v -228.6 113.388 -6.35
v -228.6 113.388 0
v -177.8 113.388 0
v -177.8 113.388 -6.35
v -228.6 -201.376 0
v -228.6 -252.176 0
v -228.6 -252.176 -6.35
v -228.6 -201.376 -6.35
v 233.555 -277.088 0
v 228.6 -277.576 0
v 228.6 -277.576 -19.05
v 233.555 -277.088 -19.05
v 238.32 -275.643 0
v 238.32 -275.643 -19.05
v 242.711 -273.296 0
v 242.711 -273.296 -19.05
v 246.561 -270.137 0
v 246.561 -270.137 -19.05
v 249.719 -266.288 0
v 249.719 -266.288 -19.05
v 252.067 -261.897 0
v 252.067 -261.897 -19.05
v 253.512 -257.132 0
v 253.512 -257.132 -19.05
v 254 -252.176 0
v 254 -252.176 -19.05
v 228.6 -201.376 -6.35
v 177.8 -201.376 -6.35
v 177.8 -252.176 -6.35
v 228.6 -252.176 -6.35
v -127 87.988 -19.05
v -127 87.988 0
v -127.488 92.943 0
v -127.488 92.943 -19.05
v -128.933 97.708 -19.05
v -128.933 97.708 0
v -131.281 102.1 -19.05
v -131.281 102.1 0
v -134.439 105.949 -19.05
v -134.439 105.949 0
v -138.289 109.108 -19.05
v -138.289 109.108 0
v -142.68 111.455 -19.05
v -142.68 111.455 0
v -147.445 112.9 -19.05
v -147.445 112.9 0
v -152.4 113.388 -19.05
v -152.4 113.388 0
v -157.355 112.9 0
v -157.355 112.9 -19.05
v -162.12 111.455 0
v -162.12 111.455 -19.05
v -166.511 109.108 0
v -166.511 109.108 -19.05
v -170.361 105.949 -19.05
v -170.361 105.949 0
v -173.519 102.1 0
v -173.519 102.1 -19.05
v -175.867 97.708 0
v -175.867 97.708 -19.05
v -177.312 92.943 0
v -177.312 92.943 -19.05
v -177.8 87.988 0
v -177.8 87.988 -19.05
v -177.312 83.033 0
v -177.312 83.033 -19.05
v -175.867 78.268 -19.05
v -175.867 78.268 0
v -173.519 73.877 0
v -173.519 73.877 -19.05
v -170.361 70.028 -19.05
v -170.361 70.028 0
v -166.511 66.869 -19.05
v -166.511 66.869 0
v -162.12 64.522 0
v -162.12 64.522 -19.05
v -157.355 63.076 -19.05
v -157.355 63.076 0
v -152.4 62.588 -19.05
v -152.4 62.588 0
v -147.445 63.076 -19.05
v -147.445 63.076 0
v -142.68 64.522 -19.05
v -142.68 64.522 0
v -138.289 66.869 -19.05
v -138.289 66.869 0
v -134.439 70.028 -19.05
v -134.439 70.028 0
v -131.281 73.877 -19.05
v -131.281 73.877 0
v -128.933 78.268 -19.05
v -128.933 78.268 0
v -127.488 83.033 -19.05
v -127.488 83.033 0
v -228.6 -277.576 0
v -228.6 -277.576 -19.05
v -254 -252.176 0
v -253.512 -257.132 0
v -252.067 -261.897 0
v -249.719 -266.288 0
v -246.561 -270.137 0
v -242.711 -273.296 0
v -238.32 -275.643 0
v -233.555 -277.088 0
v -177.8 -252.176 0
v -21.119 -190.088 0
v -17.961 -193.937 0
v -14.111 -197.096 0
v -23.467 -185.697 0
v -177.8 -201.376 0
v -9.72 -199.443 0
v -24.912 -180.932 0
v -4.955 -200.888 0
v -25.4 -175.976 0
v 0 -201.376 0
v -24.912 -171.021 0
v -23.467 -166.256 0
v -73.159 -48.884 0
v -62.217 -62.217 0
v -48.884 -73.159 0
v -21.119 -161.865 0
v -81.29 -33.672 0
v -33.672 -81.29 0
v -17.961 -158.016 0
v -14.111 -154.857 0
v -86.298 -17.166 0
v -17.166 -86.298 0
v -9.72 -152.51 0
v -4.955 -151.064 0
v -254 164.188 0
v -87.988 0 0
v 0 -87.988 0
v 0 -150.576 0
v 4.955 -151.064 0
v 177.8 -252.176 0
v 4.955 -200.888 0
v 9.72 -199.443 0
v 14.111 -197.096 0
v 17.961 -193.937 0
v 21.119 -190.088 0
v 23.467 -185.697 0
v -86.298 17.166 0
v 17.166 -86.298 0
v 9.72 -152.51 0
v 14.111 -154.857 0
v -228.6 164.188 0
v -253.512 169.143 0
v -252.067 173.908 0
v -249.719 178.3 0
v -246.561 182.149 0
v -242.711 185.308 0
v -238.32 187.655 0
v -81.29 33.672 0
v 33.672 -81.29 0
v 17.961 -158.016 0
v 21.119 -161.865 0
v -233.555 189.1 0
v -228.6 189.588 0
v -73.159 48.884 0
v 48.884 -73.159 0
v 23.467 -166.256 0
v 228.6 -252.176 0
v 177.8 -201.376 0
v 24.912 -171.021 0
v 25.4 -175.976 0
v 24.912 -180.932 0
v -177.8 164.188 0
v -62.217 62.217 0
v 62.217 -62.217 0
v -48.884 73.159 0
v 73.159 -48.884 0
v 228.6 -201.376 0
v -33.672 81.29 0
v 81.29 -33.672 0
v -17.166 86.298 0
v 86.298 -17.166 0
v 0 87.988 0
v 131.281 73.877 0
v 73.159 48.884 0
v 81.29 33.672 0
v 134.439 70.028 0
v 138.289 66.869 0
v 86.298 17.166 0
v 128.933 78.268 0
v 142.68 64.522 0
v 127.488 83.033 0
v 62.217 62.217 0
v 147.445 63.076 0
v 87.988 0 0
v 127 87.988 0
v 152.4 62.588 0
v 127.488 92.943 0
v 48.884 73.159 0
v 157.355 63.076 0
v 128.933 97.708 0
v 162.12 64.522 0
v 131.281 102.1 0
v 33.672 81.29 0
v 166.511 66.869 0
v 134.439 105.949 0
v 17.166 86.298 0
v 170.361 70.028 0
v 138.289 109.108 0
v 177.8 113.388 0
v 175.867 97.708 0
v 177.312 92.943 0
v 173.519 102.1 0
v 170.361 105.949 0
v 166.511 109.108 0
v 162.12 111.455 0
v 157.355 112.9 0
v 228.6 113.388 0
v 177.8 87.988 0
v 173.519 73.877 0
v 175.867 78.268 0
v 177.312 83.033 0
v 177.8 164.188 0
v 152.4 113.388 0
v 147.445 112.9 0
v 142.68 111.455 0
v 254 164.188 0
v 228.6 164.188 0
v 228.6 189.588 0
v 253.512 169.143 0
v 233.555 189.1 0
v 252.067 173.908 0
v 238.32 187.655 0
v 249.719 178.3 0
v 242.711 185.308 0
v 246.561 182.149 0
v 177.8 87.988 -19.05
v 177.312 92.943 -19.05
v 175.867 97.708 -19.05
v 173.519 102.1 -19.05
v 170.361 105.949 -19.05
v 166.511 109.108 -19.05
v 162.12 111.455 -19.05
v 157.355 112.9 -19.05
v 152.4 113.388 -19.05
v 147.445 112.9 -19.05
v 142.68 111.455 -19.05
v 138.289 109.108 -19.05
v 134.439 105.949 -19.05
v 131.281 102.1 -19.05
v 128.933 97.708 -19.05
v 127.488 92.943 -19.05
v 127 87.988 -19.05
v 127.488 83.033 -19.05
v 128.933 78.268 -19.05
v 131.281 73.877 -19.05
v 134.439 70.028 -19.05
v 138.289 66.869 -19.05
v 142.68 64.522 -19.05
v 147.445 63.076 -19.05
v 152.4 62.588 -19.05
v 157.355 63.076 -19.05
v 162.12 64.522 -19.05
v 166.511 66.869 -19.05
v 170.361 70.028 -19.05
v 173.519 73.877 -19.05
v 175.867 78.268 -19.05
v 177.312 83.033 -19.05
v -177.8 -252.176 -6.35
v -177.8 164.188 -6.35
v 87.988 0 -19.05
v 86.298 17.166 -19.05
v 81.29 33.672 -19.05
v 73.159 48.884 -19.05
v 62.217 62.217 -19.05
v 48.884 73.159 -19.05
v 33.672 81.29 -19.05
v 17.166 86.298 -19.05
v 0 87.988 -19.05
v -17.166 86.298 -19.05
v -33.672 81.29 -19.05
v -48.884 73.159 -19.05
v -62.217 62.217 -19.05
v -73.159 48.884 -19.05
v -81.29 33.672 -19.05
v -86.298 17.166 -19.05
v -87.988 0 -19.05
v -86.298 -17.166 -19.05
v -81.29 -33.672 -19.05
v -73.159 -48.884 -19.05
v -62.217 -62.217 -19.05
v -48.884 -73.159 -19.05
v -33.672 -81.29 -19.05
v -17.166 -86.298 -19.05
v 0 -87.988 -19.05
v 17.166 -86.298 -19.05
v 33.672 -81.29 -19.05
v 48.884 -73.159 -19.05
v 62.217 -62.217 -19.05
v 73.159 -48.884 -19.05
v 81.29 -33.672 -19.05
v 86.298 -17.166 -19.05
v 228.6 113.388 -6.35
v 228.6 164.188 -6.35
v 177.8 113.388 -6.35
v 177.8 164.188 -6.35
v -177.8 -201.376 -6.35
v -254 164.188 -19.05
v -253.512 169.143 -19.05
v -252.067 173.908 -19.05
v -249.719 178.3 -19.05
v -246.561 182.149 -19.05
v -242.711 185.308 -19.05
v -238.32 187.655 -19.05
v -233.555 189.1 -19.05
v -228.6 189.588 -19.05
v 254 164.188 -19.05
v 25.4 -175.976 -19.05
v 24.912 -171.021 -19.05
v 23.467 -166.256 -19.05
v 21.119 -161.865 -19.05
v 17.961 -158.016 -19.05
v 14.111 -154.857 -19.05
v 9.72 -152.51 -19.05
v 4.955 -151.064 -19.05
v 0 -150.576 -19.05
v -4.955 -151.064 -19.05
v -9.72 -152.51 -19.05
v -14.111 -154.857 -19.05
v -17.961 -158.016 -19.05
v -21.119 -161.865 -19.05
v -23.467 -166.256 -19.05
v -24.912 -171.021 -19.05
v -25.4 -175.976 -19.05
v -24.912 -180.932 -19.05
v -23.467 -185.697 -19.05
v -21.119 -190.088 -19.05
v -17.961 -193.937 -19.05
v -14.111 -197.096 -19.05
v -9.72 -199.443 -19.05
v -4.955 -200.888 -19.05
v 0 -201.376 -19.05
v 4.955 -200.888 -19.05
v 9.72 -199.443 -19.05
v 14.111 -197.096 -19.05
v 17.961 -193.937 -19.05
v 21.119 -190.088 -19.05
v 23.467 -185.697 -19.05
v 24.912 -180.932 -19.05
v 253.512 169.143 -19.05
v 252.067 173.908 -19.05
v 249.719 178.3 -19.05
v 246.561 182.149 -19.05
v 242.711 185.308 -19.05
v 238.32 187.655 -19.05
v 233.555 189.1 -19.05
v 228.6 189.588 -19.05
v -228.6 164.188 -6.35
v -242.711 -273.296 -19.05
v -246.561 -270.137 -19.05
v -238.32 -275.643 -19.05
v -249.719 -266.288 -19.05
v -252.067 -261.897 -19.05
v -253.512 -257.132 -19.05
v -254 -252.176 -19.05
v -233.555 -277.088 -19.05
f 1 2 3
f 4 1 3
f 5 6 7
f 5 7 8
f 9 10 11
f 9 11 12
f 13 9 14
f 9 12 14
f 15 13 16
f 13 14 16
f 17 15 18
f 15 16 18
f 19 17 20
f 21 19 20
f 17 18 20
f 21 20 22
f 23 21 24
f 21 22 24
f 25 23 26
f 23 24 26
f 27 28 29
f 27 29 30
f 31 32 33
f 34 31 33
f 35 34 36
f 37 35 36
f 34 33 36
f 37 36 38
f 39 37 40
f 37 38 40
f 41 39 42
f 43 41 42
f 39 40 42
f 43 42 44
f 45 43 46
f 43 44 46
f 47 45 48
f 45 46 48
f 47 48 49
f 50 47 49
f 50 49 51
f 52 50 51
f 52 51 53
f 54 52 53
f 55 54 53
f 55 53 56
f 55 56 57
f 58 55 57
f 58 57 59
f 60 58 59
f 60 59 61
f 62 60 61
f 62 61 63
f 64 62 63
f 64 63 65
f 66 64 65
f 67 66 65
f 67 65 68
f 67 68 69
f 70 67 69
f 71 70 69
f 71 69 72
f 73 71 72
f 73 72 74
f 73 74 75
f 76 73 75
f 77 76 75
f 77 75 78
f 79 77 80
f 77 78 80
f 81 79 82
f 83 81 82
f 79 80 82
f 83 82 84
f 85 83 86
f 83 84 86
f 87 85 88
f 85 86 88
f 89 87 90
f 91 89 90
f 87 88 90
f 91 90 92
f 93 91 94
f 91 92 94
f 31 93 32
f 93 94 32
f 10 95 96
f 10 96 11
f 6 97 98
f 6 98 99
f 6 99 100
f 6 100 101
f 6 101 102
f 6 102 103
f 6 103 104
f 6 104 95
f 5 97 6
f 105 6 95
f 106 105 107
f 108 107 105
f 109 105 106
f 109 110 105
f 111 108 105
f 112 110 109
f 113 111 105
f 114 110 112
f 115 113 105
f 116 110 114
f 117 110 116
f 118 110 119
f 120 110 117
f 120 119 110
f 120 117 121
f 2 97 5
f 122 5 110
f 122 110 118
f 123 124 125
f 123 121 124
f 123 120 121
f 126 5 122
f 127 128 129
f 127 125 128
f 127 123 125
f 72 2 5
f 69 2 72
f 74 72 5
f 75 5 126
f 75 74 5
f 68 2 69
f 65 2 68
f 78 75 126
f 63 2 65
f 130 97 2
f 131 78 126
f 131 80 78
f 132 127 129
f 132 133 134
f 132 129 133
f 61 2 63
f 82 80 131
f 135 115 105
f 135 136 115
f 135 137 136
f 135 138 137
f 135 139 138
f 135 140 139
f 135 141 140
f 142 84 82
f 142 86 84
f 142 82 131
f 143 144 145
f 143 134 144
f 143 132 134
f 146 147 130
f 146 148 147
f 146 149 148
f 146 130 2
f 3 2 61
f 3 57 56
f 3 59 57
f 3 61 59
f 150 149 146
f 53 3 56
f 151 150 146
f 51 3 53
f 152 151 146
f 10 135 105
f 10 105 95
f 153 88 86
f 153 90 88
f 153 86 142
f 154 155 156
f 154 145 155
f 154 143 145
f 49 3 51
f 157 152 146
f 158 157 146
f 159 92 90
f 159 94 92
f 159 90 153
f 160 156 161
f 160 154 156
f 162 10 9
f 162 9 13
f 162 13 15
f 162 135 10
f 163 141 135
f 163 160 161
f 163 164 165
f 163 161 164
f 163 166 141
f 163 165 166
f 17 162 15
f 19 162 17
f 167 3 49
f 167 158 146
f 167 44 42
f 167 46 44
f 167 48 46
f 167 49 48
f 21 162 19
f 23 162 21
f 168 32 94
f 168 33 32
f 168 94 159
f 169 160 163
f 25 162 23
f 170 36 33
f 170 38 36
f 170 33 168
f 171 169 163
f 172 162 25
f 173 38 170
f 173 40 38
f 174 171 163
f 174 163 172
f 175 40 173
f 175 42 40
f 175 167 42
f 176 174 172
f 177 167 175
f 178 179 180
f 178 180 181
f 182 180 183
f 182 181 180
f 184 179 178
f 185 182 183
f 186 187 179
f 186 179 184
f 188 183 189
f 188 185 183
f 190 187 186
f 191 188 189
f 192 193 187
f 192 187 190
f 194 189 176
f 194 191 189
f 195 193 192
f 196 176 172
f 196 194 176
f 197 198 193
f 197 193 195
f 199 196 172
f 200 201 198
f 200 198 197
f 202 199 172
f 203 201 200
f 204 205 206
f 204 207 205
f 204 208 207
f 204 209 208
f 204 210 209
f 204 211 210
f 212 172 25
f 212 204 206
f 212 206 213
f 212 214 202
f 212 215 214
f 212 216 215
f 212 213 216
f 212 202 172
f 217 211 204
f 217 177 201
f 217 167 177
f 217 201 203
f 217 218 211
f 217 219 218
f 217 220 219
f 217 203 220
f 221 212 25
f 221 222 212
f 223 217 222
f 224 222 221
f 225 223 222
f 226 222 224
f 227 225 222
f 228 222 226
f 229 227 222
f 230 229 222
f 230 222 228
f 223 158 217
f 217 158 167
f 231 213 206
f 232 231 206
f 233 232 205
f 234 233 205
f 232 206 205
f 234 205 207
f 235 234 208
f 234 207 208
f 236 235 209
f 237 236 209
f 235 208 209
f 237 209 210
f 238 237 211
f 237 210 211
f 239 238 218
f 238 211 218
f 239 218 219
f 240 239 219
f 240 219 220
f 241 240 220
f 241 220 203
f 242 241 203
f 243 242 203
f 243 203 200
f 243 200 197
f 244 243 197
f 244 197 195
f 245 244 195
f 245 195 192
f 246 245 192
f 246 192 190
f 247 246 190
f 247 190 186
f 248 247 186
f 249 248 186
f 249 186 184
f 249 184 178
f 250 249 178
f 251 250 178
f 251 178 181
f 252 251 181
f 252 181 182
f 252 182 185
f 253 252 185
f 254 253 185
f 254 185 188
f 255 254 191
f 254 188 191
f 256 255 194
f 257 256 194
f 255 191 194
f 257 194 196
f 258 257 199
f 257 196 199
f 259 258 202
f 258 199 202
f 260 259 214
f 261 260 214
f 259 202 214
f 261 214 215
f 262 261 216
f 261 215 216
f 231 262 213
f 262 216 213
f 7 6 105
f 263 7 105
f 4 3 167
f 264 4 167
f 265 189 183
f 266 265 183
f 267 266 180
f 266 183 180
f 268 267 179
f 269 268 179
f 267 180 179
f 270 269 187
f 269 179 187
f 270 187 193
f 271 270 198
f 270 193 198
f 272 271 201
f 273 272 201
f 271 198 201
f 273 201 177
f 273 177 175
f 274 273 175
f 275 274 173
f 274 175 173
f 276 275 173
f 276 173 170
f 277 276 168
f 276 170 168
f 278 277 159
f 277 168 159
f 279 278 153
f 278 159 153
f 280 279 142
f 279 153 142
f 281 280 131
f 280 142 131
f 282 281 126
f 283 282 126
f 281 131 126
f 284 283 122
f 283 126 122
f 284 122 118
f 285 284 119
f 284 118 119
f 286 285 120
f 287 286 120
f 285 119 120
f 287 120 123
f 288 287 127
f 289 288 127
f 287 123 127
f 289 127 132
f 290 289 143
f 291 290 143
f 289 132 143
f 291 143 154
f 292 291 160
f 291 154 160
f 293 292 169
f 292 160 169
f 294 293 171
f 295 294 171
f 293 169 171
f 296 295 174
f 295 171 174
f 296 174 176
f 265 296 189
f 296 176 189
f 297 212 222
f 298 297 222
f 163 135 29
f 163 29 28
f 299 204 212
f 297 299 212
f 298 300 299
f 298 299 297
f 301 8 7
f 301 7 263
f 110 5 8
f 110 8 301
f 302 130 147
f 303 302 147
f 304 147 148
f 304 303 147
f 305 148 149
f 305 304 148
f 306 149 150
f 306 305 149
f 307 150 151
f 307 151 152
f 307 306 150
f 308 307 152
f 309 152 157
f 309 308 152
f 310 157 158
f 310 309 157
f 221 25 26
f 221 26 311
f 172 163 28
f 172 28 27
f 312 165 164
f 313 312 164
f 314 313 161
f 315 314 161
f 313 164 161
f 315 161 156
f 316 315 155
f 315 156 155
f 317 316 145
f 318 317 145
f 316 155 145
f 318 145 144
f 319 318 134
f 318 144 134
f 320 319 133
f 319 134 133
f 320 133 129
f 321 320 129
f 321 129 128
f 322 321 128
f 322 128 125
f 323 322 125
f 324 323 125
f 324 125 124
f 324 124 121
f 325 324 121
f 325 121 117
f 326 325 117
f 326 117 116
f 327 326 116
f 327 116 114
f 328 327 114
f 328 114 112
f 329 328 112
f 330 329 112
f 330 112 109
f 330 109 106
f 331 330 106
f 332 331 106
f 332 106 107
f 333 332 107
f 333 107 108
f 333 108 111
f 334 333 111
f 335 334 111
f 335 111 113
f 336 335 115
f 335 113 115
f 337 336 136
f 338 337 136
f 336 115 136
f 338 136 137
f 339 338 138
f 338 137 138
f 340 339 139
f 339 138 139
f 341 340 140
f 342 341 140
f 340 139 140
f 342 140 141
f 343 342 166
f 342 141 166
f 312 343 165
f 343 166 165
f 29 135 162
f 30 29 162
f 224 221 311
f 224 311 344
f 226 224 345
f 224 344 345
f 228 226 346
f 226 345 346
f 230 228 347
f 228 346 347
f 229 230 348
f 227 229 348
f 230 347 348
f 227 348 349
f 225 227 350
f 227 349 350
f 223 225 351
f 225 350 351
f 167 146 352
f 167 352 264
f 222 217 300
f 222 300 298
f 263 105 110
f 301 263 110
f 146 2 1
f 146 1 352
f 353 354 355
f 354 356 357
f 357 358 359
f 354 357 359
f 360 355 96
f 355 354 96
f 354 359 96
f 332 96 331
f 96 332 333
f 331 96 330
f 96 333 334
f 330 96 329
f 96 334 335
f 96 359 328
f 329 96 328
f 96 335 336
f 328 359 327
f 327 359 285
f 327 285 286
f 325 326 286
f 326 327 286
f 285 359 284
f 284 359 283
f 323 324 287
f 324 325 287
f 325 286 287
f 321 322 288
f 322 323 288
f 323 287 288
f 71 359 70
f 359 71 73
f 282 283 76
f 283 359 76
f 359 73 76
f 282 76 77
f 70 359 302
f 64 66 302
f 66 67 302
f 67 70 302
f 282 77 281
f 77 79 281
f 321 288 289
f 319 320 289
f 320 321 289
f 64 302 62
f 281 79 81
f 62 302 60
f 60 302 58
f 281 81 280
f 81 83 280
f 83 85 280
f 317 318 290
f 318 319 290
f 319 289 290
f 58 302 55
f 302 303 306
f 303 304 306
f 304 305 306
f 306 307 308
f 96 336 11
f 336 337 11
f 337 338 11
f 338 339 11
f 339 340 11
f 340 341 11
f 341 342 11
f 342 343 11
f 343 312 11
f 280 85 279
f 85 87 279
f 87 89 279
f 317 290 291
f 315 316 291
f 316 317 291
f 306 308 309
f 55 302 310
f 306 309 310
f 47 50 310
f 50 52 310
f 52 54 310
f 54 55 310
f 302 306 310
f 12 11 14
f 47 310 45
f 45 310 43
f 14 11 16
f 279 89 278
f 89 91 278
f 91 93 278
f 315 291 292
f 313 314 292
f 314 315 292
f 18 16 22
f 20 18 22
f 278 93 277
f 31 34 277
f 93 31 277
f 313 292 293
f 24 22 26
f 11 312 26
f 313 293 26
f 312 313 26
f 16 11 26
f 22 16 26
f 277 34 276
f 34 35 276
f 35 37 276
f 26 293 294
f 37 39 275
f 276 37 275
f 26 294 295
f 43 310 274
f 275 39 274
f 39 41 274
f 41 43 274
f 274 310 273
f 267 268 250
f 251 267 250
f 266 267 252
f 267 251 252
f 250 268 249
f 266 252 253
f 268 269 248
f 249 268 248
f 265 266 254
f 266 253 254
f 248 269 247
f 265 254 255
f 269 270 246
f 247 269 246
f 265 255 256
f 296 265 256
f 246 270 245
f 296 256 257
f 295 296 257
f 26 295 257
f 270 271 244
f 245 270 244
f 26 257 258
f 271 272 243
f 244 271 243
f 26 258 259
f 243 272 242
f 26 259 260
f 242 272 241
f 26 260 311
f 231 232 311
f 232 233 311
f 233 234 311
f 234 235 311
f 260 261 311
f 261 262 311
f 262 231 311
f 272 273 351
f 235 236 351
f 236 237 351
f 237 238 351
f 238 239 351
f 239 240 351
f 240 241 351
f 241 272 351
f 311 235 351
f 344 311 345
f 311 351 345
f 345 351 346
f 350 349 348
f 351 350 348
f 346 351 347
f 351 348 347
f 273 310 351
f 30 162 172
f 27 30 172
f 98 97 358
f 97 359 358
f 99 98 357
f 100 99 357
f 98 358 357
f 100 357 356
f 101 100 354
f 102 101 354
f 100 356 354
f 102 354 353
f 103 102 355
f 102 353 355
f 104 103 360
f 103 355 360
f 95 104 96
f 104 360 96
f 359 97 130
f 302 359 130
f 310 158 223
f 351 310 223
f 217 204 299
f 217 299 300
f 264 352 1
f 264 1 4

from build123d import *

# Parameters (mm, degrees)
F0_W     = 508
F0_H     = 467.164543
F0_W_2   = 50.8
F0_H_2   = 50.8
F0_R     = 25.4
F0_R_2   = 87.988181
F1_DEPTH = 19.05
F2_R     = 25.4
F3_DEPTH = 6.35
F4_DEPTH = 19.051


with BuildPart() as f1:
    # F0 (on Top) → F1 (new body)
    with BuildSketch(Plane.XY):
        with Locations((0, -43.99409)):
            Rectangle(F0_W, F0_H)
        with Locations((-203.2, -226.776362)):
            Rectangle(F0_W_2, F0_H_2, mode=Mode.SUBTRACT)
        with Locations((0, -175.976362)):
            Circle(F0_R, mode=Mode.SUBTRACT)
        with Locations((203.2, -226.776362)):
            Rectangle(F0_W_2, F0_H_2, mode=Mode.SUBTRACT)
        with Locations((-152.4, 87.988181)):
            Circle(F0_R, mode=Mode.SUBTRACT)
        with Locations((-203.2, 138.788181)):
            Rectangle(F0_W_2, F0_H_2, mode=Mode.SUBTRACT)
        Circle(F0_R_2, mode=Mode.SUBTRACT)
        with Locations((152.4, 87.988181)):
            Circle(F0_R, mode=Mode.SUBTRACT)
        with Locations((203.2, 138.788181)):
            Rectangle(F0_W_2, F0_H_2, mode=Mode.SUBTRACT)
        with Locations((-203.2, 138.788181)):
            Rectangle(F0_W_2, F0_H_2)
        with Locations((-203.2, -226.776362)):
            Rectangle(F0_W_2, F0_H_2)
        with Locations((203.2, -226.776362)):
            Rectangle(F0_W_2, F0_H_2)
        with Locations((203.2, 138.788181)):
            Rectangle(F0_W_2, F0_H_2)
        with Locations((-152.4, 87.988181)):
            Circle(F0_R)
        with Locations((152.4, 87.988181)):
            Circle(F0_R)
        with Locations((0, -175.976362)):
            Circle(F0_R)
    extrude(amount=-F1_DEPTH)

    # F2
    f2_edges = [f1.edges().sort_by_distance(p)[0] for p in [
        (-254, 189.588181, -9.525),
        (254, 189.588181, -9.525),
        (-254, -277.576362, -9.525),
        (254, -277.576362, -9.525),
    ]]
    fillet(f2_edges, radius=F2_R)

    # F0 (on Top) → F3 (cut)
    with BuildSketch(Plane.XY):
        with Locations((-203.2, -226.776362)):
            Rectangle(F0_W_2, F0_H_2)
        with Locations((-203.2, 138.788181)):
            Rectangle(F0_W_2, F0_H_2)
        with Locations((203.2, -226.776362)):
            Rectangle(F0_W_2, F0_H_2)
        with Locations((203.2, 138.788181)):
            Rectangle(F0_W_2, F0_H_2)
    extrude(amount=-F3_DEPTH, mode=Mode.SUBTRACT)

    # F0 (on Top) → F4 (cut, through all)
    with BuildSketch(Plane.XY):
        with Locations((-152.4, 87.988181)):
            Circle(F0_R)
        with Locations((0, -175.976362)):
            Circle(F0_R)
        with Locations((152.4, 87.988181)):
            Circle(F0_R)
    extrude(amount=-F4_DEPTH, mode=Mode.SUBTRACT)


solid = f1.part
